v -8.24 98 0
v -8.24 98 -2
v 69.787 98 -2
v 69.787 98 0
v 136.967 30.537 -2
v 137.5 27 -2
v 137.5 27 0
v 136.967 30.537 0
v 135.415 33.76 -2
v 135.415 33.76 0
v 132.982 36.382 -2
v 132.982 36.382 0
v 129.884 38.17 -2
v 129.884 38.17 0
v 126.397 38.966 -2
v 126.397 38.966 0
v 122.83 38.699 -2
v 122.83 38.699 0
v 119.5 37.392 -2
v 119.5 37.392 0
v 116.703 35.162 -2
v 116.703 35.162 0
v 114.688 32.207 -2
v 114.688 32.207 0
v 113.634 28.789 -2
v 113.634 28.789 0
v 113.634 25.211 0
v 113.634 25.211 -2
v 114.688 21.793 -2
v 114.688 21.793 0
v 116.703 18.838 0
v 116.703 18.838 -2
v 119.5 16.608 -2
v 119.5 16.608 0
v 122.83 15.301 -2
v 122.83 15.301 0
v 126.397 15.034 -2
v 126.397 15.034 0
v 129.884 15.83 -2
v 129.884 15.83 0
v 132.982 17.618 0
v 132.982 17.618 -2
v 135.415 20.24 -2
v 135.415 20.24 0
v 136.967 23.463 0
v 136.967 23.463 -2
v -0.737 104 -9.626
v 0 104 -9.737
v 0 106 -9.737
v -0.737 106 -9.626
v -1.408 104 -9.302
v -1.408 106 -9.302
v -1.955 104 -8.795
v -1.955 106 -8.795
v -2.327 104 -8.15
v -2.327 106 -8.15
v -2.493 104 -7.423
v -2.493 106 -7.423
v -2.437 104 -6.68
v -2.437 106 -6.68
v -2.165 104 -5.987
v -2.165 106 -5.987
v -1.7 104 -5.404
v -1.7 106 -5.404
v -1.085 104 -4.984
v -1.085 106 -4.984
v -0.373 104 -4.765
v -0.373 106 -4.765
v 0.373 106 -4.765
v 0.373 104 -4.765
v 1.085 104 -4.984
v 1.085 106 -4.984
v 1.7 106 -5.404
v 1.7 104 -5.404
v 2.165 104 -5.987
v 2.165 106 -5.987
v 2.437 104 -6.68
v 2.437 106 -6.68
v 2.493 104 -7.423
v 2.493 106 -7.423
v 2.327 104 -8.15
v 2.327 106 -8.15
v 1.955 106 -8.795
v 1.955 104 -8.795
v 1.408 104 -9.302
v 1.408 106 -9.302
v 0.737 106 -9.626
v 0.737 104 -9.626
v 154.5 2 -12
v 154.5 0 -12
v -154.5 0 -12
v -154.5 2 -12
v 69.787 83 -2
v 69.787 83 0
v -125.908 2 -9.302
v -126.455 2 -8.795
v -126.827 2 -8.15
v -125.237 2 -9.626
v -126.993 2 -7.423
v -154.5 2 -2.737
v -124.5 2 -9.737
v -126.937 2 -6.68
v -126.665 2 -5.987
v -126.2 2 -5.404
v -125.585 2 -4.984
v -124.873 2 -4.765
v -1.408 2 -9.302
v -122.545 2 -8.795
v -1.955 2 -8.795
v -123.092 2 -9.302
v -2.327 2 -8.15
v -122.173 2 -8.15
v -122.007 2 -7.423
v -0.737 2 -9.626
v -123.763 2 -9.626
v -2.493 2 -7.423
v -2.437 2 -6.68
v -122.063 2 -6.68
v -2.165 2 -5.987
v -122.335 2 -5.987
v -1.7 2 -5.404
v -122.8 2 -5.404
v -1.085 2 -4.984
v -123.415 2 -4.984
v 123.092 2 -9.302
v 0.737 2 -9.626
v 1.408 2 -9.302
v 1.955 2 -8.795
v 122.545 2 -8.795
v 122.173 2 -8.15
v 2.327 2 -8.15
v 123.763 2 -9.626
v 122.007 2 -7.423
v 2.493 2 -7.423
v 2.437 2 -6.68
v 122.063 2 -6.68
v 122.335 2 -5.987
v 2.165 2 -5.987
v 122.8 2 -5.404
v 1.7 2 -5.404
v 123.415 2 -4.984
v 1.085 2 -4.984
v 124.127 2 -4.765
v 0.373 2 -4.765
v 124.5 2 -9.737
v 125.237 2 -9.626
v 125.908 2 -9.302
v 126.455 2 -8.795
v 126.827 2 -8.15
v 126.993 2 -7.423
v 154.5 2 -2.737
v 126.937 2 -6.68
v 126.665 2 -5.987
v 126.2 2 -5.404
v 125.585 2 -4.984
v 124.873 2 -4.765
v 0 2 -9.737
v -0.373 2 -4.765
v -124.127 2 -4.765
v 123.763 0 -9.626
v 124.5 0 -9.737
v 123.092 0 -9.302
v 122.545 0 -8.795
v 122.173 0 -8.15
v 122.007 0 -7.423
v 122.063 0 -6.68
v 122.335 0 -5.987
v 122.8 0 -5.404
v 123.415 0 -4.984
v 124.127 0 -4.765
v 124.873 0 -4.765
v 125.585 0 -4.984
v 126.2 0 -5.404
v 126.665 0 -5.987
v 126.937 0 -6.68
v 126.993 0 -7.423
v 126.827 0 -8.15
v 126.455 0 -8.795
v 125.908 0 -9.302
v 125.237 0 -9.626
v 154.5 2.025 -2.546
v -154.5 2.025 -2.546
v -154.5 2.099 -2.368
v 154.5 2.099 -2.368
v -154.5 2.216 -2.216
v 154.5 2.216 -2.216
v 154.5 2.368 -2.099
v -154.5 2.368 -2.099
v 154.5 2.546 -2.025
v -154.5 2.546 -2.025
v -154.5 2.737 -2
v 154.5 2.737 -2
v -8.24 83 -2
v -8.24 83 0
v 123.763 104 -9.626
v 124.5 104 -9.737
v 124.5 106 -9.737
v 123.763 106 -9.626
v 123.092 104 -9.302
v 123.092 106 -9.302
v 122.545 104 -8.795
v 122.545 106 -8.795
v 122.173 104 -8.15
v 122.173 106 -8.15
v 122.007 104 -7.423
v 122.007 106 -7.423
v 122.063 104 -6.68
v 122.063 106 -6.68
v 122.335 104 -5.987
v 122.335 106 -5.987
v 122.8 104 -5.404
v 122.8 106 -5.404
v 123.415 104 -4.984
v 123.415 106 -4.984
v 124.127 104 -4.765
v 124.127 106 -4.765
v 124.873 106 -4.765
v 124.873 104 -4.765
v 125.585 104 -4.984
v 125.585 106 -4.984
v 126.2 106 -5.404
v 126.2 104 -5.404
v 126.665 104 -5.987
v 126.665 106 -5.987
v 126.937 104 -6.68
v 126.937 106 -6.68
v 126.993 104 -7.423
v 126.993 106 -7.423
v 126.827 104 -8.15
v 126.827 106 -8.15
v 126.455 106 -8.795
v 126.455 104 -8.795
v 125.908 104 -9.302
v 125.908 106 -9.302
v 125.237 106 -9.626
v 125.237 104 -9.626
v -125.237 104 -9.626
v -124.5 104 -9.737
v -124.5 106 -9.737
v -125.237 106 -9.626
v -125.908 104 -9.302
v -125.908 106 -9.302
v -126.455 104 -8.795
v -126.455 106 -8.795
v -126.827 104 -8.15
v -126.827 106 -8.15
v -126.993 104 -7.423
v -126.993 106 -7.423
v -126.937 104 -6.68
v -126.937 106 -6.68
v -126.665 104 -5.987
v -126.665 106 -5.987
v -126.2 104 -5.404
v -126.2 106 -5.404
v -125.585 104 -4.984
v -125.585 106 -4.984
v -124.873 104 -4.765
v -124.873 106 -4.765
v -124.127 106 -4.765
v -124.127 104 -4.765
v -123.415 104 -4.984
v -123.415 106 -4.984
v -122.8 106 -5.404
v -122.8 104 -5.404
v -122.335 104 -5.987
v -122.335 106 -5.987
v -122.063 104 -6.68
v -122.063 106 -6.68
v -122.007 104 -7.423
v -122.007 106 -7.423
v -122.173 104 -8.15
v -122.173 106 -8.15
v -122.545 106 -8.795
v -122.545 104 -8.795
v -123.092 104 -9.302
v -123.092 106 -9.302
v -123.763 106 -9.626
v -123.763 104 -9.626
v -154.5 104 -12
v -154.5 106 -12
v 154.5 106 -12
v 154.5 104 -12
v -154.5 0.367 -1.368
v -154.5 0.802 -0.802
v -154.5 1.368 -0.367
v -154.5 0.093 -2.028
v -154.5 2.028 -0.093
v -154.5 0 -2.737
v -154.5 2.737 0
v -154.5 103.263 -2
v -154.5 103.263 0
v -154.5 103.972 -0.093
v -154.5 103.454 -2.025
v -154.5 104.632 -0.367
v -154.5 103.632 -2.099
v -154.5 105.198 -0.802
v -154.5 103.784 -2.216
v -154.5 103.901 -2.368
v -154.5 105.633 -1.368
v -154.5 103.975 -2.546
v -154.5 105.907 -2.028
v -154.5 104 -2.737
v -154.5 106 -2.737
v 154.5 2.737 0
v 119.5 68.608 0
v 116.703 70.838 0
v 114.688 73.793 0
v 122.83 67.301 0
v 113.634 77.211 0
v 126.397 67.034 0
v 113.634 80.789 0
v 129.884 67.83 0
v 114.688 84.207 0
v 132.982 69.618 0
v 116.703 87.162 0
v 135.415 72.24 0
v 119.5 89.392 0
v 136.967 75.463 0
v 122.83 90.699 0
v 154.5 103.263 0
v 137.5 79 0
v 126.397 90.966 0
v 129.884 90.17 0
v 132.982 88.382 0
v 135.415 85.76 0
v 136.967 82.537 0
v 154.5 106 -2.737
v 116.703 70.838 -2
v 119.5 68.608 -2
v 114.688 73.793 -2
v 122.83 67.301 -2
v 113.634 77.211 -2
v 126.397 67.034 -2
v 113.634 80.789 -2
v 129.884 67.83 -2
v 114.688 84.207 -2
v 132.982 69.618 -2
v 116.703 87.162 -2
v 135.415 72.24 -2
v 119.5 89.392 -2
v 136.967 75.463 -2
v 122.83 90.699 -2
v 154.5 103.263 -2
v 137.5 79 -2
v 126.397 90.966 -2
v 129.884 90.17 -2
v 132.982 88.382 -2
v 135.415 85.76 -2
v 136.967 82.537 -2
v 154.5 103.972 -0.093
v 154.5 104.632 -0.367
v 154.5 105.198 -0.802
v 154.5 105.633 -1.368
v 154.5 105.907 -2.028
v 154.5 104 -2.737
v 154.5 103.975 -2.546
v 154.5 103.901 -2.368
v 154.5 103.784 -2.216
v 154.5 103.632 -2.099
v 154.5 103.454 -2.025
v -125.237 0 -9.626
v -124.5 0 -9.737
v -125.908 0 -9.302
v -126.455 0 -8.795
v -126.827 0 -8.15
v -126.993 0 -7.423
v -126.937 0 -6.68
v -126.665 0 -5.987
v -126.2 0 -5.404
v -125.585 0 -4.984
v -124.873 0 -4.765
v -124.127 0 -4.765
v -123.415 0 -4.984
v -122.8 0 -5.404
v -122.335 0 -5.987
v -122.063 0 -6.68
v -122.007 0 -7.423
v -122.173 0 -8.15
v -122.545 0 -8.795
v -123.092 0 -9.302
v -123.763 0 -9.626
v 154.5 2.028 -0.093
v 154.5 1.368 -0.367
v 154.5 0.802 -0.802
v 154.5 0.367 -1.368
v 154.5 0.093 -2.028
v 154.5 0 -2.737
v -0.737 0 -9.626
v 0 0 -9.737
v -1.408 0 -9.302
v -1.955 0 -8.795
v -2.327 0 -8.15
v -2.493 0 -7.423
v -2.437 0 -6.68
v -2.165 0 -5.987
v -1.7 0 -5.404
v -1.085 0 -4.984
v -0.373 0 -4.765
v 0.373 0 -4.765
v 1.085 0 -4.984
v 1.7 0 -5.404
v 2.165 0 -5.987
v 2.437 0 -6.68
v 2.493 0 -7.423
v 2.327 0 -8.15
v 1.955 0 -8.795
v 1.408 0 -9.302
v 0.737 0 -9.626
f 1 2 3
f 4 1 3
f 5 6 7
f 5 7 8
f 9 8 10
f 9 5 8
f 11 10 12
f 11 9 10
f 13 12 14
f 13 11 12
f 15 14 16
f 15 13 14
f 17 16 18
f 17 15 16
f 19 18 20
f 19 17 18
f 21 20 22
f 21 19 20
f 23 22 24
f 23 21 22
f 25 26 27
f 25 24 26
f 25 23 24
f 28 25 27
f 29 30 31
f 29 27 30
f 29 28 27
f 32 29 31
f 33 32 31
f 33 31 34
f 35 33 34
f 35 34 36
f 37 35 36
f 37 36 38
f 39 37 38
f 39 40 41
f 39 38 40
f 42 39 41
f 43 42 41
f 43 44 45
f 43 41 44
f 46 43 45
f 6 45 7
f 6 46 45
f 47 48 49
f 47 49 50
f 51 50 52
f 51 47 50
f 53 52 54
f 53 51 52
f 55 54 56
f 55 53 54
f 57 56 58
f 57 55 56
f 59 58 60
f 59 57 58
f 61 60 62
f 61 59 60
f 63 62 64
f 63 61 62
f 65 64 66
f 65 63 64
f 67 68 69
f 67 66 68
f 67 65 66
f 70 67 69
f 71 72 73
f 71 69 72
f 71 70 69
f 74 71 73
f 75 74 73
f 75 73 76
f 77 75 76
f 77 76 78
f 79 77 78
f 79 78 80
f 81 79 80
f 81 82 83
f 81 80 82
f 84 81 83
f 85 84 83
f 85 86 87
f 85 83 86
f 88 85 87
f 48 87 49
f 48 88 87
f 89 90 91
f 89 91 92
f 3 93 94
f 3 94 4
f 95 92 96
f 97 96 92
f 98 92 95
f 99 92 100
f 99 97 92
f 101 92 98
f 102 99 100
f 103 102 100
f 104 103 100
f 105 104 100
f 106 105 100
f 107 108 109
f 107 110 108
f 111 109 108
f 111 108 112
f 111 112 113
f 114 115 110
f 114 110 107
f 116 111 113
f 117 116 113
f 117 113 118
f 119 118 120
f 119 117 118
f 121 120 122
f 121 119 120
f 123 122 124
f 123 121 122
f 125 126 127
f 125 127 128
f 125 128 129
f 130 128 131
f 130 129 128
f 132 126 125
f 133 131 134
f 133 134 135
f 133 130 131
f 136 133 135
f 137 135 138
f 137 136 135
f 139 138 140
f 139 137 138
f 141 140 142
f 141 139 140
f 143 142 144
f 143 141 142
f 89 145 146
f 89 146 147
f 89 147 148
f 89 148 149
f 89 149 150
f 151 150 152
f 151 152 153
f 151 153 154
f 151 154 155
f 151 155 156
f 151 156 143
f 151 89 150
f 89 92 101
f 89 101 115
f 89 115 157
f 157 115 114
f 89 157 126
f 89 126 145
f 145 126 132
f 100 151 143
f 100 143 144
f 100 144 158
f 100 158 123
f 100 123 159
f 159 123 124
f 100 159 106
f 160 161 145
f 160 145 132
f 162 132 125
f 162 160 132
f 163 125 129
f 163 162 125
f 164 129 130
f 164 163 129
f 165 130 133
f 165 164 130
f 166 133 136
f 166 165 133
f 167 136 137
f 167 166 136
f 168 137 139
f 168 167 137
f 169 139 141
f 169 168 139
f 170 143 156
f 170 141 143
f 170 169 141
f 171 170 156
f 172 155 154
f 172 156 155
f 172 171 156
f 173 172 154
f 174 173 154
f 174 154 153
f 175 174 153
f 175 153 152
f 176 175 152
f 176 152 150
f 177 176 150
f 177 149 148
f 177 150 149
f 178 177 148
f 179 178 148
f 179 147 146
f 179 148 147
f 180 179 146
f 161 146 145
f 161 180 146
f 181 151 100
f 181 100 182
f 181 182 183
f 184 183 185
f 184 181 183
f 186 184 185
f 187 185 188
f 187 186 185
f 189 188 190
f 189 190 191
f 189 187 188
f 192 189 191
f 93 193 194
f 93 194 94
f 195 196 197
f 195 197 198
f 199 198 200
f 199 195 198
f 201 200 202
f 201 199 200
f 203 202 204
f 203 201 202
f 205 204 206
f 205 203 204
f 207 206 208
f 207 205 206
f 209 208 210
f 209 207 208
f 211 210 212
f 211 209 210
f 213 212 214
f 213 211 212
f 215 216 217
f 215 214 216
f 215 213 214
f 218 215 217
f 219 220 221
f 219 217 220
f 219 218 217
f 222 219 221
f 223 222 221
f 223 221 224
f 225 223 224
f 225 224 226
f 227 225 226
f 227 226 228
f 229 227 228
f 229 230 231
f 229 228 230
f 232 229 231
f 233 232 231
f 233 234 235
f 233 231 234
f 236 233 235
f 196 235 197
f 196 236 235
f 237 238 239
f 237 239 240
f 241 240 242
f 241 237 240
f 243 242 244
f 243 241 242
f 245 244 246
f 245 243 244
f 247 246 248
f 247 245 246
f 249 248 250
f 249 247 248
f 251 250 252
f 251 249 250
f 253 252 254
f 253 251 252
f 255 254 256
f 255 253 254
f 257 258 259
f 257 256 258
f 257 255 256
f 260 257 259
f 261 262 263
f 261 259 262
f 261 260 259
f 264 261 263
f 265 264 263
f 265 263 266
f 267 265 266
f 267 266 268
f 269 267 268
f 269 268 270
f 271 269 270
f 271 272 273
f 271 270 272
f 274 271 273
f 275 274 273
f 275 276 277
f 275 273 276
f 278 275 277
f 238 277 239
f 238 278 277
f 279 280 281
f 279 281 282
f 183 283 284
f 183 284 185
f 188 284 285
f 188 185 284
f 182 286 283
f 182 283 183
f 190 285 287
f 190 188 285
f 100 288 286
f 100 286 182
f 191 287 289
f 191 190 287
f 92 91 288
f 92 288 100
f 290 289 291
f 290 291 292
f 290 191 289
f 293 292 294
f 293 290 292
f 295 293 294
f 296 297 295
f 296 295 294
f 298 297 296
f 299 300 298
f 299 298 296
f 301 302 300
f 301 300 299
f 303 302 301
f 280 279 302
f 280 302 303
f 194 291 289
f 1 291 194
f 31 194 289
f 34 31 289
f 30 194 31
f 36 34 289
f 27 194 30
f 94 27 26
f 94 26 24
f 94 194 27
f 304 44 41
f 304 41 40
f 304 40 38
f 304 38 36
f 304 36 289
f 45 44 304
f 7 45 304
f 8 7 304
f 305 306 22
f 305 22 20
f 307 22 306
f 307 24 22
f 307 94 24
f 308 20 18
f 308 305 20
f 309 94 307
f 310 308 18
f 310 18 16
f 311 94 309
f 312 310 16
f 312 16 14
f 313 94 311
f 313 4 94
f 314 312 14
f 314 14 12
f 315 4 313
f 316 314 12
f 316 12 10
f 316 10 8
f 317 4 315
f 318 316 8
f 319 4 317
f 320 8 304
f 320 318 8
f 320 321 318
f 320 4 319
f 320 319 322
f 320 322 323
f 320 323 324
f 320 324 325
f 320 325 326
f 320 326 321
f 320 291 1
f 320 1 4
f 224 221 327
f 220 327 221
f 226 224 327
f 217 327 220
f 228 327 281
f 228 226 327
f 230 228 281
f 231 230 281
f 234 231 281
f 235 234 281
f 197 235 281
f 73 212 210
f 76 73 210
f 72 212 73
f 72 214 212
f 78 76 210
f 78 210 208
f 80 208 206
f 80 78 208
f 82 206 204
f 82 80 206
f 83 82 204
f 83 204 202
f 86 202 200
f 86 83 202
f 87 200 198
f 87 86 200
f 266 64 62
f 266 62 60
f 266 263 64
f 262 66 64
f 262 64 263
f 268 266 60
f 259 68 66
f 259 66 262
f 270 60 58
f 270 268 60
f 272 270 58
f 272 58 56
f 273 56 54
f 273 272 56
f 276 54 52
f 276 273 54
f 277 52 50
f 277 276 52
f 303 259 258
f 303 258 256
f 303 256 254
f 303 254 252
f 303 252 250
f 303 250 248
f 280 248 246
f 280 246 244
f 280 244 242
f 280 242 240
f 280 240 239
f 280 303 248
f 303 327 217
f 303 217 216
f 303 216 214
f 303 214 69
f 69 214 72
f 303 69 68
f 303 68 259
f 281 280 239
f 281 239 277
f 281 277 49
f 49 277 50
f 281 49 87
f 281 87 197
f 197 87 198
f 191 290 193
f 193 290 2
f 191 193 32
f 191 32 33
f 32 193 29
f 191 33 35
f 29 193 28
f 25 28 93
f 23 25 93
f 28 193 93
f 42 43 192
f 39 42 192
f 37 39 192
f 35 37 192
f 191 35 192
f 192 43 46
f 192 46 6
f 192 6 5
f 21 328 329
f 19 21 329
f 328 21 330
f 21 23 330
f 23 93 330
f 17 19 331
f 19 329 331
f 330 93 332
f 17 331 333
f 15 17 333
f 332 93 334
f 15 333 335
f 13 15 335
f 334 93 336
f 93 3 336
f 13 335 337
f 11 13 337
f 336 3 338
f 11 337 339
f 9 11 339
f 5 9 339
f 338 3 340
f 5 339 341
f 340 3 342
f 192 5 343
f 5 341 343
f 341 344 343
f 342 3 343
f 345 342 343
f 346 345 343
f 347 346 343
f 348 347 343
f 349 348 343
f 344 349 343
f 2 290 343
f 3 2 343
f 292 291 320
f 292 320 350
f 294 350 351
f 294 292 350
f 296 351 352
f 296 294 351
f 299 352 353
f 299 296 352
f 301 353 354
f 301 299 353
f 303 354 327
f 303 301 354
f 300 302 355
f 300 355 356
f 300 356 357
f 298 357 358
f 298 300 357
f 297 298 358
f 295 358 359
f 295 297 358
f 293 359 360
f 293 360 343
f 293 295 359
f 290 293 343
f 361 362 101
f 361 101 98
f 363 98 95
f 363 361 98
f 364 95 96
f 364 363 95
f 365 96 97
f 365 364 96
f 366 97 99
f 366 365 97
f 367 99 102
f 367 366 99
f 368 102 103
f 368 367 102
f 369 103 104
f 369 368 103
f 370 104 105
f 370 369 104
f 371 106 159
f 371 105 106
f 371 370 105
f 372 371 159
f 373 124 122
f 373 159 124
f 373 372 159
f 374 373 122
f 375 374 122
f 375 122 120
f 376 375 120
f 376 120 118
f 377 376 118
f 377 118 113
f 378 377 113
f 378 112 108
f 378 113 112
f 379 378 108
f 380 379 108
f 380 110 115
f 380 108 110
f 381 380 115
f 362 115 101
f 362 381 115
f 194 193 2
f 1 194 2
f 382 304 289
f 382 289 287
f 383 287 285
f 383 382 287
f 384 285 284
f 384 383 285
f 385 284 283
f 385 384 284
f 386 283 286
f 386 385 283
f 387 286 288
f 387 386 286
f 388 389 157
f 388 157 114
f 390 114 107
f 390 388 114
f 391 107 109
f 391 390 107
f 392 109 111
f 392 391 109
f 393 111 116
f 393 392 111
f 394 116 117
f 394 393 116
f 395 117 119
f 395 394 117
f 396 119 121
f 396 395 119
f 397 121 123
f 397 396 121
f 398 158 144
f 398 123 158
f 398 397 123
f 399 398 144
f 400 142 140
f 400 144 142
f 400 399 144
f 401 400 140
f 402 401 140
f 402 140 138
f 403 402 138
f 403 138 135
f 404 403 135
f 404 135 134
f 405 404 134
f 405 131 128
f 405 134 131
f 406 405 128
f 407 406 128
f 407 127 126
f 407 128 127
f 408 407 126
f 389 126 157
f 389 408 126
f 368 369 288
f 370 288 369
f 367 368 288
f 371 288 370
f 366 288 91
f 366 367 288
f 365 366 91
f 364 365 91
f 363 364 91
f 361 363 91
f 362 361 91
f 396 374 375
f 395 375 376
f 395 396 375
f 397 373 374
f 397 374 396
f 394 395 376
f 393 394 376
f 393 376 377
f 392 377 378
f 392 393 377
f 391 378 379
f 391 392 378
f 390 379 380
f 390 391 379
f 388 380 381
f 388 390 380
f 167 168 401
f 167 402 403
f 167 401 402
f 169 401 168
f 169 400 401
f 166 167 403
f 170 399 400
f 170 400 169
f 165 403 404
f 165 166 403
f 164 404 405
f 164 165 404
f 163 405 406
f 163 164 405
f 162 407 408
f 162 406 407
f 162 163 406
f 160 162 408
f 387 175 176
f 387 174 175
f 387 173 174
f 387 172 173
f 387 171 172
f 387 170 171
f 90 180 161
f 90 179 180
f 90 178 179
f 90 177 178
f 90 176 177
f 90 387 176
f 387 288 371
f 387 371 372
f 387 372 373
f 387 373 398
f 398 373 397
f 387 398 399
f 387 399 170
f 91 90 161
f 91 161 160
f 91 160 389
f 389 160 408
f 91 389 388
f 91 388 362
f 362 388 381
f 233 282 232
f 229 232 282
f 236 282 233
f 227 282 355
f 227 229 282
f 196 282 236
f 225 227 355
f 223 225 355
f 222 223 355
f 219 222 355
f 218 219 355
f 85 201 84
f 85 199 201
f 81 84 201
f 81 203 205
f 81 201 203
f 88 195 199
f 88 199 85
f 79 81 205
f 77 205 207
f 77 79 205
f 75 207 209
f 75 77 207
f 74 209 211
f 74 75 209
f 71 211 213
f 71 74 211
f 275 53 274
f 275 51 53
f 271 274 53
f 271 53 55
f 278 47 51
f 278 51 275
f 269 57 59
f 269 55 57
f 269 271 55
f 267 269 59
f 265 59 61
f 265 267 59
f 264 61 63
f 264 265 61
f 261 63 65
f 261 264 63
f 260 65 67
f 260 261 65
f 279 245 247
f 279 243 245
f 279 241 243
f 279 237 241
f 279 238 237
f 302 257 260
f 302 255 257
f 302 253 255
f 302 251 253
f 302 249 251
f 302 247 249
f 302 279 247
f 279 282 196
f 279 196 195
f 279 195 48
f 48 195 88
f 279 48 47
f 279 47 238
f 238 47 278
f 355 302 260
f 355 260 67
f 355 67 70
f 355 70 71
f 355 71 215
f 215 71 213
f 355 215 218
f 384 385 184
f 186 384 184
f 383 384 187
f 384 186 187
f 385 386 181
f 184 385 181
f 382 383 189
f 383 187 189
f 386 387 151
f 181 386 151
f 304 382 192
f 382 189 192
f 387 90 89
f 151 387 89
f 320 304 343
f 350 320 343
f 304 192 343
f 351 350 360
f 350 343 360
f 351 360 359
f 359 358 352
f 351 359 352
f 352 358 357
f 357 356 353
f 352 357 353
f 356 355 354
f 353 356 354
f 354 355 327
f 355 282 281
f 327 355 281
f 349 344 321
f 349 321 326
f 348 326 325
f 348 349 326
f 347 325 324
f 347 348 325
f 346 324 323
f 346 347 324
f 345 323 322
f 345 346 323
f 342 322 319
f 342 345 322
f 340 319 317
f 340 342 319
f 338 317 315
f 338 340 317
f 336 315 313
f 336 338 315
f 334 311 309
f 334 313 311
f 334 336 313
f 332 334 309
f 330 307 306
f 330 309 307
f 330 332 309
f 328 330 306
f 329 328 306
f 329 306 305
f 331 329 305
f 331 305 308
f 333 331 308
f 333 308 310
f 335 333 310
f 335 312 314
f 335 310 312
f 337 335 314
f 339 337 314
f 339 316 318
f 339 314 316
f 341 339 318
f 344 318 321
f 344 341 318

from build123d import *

# Parameters (mm, degrees)
SKETCH2_W                      = 309
SKETCH2_H                      = 106
BASE_FLANGE1_DEPTH             = 2
EDGE_FLANGE1_STRIP_W           = 9.4732
EDGE_FLANGE1_STRIP_H           = 2
EDGE_FLANGE1_STRIP_CUT_DEPTH   = 309
EDGE_FLANGE1_STRIP_2_W         = 9.4732
EDGE_FLANGE1_STRIP_2_H         = 2
EDGE_FLANGE1_STRIP_CUT_2_DEPTH = 309
EDGE_FLANGE1_DEPTH             = 309
EDGE_FLANGE1_BEND_DEPTH        = 309
CUT_EXTRUDE1_DEPTH             = 188.750499334
CUT_EXTRUDE1_DEPTH_BACK        = 188.750499334
SKETCH13_R                     = 12
CUT_EXTRUDE2_DEPTH             = 188.750499334
CUT_EXTRUDE2_DEPTH_BACK        = 188.750499334
SKETCH14_W                     = 78.027092835
SKETCH14_H                     = 15
CUT_EXTRUDE3_DEPTH             = 188.750499334
CUT_EXTRUDE3_DEPTH_BACK        = 188.750499334
SKETCH15_R                     = 2.5


# Sheet-metal steps are written as plain solids
with BuildPart() as part:
    # Sketch2 → Base-Flange1 (new body)
    with BuildSketch(Plane.XY):
        with Locations((0, 53)):
            Rectangle(SKETCH2_W, SKETCH2_H)
    extrude(amount=-BASE_FLANGE1_DEPTH)

    # Edge-Flange1 strip (across the edge) → Edge-Flange1 strip cut (cut)
    with BuildSketch(Plane(origin=(154.5, 0, -2), x_dir=(0, 1, 0), z_dir=(-1, 0, 0))):
        with Locations((-2, -1)):
            Rectangle(EDGE_FLANGE1_STRIP_W, EDGE_FLANGE1_STRIP_H)
    extrude(amount=EDGE_FLANGE1_STRIP_CUT_DEPTH, mode=Mode.SUBTRACT)

    # Edge-Flange1 strip 2 (across the edge) → Edge-Flange1 strip cut 2 (cut)
    with BuildSketch(Plane(origin=(-154.5, 106, -2), x_dir=(0, -1, 0), z_dir=(1, 0, 0))):
        with Locations((-2, -1)):
            Rectangle(EDGE_FLANGE1_STRIP_2_W, EDGE_FLANGE1_STRIP_2_H)
    extrude(amount=EDGE_FLANGE1_STRIP_CUT_2_DEPTH, mode=Mode.SUBTRACT)

    # Edge-Flange1 section (across the edge) → Edge-Flange1 (add)
    with BuildSketch(Plane(origin=(154.5, 0, -2), x_dir=(0, 1, 0), z_dir=(-1, 0, 0))):
        with BuildLine():
            Line((0, 0.7366), (0, 10))
            Line((0, 10), (2, 10))
            Line((2, 10), (2, 0.7366))
            ThreePointArc((2, 0.7366), (2.215745145, 0.215745145), (2.7366, 0))
            Line((2.7366, 0), (2.7366, -2))
            ThreePointArc((2.7366, -2), (0.801531583, -1.198468417), (0, 0.7366))
        make_face()
    extrude(amount=EDGE_FLANGE1_DEPTH)

    # Edge-Flange1 section 2 (across the edge) → Edge-Flange1 bend (add)
    with BuildSketch(Plane(origin=(-154.5, 106, -2), x_dir=(0, -1, 0), z_dir=(1, 0, 0))):
        with BuildLine():
            Line((0, 0.7366), (0, 10))
            Line((0, 10), (2, 10))
            Line((2, 10), (2, 0.7366))
            ThreePointArc((2, 0.7366), (2.215745145, 0.215745145), (2.7366, 0))
            Line((2.7366, 0), (2.7366, -2))
            ThreePointArc((2.7366, -2), (0.801531583, -1.198468417), (0, 0.7366))
        make_face()
    extrude(amount=EDGE_FLANGE1_BEND_DEPTH)

    # Sketch13 → Cut-Extrude1 (cut, two sides: drawn at the far end of the back side and taken through both)
    with BuildSketch(Plane.XY.offset(-CUT_EXTRUDE1_DEPTH_BACK)):
        with Locations((125.5, 79)):
            Circle(SKETCH13_R)
        with Locations((125.5, 27)):
            Circle(SKETCH13_R)
    extrude(amount=CUT_EXTRUDE1_DEPTH + CUT_EXTRUDE1_DEPTH_BACK, mode=Mode.SUBTRACT)

    # Sketch14 → Cut-Extrude2 (cut, two sides: drawn at the far end of the back side and taken through both)
    with BuildSketch(Plane.XY.offset(-CUT_EXTRUDE2_DEPTH_BACK)):
        with Locations((30.773130234, 90.5)):
            Rectangle(SKETCH14_W, SKETCH14_H)
    extrude(amount=CUT_EXTRUDE2_DEPTH + CUT_EXTRUDE2_DEPTH_BACK, mode=Mode.SUBTRACT)

    # Sketch15 → Cut-Extrude3 (cut, two sides: drawn at the far end of the back side and taken through both)
    with BuildSketch(Plane(origin=(0, 106, 0), x_dir=(1, 0, 0), z_dir=(0, 1, 0)).offset(-CUT_EXTRUDE3_DEPTH_BACK)):
        with Locations(Location((124.5, 7.2366, 0), (0, 0, 90))):
            Circle(SKETCH15_R)
        with Locations(Location((0, 7.2366, 0), (0, 0, 90))):
            Circle(SKETCH15_R)
        with Locations(Location((-124.5, 7.2366, 0), (0, 0, 90))):
            Circle(SKETCH15_R)
    extrude(amount=CUT_EXTRUDE3_DEPTH + CUT_EXTRUDE3_DEPTH_BACK, mode=Mode.SUBTRACT)


solid = part.part
